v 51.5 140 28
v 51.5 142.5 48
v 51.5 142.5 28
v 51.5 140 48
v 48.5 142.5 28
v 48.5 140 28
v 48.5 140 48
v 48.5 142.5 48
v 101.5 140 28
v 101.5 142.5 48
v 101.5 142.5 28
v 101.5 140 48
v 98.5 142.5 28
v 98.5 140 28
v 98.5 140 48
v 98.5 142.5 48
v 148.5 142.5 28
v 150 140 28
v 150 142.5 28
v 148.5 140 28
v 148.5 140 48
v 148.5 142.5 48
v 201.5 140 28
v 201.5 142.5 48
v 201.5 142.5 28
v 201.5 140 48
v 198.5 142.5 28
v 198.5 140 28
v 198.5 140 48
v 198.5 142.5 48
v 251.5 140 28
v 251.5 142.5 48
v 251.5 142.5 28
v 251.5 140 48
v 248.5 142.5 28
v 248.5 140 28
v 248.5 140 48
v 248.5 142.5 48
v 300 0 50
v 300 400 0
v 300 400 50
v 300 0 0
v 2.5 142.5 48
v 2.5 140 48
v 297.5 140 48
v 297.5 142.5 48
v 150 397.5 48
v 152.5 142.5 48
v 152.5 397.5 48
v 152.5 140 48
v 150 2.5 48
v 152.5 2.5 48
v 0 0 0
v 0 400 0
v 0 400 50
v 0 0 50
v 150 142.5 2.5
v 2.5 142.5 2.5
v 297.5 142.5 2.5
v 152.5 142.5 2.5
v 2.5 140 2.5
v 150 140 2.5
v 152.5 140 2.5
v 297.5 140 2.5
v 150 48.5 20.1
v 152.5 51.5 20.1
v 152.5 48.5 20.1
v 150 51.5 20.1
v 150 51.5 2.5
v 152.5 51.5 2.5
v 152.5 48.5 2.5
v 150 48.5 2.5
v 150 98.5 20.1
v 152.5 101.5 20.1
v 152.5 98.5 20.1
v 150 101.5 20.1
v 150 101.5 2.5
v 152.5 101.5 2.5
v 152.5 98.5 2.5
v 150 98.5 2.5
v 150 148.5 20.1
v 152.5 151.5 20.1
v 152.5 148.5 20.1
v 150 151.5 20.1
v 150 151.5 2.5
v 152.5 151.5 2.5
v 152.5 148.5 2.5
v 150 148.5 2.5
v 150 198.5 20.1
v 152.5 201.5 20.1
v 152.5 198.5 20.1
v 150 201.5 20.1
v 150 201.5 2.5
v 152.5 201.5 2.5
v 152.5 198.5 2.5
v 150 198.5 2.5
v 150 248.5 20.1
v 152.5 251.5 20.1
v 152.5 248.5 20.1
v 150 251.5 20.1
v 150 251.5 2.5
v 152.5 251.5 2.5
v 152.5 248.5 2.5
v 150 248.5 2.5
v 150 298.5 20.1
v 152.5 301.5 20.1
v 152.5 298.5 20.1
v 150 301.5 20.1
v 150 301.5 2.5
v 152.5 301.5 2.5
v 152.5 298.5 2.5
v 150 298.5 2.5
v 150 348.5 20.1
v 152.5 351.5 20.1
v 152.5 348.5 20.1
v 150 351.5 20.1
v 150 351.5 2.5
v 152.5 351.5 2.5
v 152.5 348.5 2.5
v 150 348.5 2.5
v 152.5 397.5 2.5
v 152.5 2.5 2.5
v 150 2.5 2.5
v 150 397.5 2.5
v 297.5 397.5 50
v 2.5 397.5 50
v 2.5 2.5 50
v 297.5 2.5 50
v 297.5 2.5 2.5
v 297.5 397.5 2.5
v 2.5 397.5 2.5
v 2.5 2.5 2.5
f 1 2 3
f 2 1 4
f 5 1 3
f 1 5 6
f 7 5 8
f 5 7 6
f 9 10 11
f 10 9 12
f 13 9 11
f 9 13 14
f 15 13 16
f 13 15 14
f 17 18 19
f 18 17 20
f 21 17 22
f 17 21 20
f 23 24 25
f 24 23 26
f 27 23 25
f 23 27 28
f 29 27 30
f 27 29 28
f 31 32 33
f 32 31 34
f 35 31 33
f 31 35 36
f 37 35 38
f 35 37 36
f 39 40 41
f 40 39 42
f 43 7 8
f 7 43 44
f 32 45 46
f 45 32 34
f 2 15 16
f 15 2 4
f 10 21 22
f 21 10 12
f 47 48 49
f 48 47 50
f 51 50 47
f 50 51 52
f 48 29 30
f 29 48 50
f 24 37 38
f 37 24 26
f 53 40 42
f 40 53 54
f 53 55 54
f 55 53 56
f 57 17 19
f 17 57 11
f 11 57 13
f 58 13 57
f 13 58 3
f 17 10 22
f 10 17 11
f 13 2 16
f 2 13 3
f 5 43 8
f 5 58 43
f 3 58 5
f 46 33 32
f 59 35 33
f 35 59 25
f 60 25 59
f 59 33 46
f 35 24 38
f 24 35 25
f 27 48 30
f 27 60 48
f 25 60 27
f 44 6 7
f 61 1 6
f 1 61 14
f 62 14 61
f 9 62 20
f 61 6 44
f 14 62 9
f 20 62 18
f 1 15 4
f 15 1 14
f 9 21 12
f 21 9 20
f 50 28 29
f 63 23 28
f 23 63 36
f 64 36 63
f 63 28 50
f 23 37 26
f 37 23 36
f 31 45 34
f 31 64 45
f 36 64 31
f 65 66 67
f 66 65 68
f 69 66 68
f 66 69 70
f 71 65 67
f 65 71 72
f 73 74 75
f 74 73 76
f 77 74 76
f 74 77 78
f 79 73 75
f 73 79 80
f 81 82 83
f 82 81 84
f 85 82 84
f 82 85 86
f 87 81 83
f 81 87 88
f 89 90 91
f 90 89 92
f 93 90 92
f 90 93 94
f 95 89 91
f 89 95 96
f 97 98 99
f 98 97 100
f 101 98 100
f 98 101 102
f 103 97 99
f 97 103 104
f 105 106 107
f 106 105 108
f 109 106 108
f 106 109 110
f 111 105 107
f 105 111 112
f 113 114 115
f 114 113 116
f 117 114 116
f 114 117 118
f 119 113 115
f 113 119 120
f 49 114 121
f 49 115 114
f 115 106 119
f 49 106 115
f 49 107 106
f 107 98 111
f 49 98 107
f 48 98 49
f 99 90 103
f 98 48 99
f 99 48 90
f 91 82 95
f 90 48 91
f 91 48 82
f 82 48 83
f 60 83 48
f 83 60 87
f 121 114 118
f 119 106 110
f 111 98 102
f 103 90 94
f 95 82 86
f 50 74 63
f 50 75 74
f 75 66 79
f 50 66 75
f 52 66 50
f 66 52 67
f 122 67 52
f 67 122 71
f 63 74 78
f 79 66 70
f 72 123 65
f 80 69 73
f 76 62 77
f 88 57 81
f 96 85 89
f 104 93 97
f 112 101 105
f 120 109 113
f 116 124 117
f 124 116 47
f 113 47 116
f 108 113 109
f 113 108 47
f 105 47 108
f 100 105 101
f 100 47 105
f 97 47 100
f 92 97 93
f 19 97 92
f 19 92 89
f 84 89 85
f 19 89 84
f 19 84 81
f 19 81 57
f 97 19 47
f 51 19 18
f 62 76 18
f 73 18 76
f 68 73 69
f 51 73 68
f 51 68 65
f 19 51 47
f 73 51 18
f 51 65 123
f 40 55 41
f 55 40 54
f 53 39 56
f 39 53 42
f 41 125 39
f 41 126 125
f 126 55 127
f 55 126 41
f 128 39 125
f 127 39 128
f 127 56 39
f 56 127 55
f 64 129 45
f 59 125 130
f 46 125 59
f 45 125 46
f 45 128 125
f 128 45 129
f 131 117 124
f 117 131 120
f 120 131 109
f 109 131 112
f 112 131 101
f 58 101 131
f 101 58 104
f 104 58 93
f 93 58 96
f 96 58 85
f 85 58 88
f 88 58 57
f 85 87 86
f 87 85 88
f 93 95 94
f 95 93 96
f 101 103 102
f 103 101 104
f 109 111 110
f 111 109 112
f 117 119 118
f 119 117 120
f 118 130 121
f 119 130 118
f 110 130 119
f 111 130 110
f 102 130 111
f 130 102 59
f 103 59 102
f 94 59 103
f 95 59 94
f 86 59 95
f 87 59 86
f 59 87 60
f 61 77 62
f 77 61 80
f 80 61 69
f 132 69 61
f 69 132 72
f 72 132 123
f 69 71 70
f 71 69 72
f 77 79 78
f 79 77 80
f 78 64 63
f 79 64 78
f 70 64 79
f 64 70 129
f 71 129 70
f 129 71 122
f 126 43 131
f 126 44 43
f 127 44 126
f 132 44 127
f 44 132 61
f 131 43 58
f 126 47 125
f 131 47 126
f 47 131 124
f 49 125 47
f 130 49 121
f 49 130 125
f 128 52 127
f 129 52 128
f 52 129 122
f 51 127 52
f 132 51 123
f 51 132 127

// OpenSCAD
// ============================================================
// Parametric Drawer Divider
// ============================================================
// Snap-fit divider strips for tool drawers, desk organizers.
// Set drawer dimensions, print as many dividers as needed.

// ---- PARAMETERS ----
// Drawer interior dimensions
drawer_w     = 300;   // Drawer internal width (mm)
drawer_d     = 400;   // Drawer internal depth (mm)
drawer_h     = 50;    // Drawer internal height (mm)

// Divider geometry
div_t        = 2.5;   // Divider thickness (mm)
div_h        = 48;    // Divider height (should be ≤ drawer_h - 1mm clearance)
slot_w       = 3.0;   // Slot width for cross-fit notching (div_t + 0.5mm)
slot_depth   = drawer_h * 0.4;  // How deep interlocking slots cut

// ---- HORIZONTAL DIVIDER (spans full drawer width) ----
module h_divider(position_y) {
    // Slots every 50mm for vertical dividers to cross
    translate([0, position_y, 0])
    difference() {
        cube([drawer_w, div_t, div_h]);
        // Top slots (for vertical divider cross-fit)
        for (x = [50 : 50 : drawer_w - 50])
            translate([x - slot_w/2, -0.1, div_h - slot_depth])
                cube([slot_w, div_t + 0.2, slot_depth + 0.1]);
    }
}

// ---- VERTICAL DIVIDER (spans full drawer depth) ----
module v_divider(position_x) {
    translate([position_x, 0, 0])
    difference() {
        cube([div_t, drawer_d, div_h]);
        // Bottom slots (cross-fit with horizontal dividers)
        for (y = [50 : 50 : drawer_d - 50])
            translate([-0.1, y - slot_w/2, 0])
                cube([div_t + 0.2, slot_w, slot_depth + 0.1]);
    }
}

// ---- SAMPLE LAYOUT ----
// This renders an example 2-section drawer layout.
// In real use, print individual dividers and assemble.
color("LightBlue", 0.8) {
    h_divider(drawer_d * 0.35);
    v_divider(drawer_w * 0.5);
}

// ---- DRAWER OUTLINE (ghost reference, remove for print) ----
color("Gray", 0.1)
difference() {
    cube([drawer_w, drawer_d, drawer_h]);
    translate([div_t, div_t, div_t])
        cube([drawer_w - div_t*2, drawer_d - div_t*2, drawer_h]);
}
